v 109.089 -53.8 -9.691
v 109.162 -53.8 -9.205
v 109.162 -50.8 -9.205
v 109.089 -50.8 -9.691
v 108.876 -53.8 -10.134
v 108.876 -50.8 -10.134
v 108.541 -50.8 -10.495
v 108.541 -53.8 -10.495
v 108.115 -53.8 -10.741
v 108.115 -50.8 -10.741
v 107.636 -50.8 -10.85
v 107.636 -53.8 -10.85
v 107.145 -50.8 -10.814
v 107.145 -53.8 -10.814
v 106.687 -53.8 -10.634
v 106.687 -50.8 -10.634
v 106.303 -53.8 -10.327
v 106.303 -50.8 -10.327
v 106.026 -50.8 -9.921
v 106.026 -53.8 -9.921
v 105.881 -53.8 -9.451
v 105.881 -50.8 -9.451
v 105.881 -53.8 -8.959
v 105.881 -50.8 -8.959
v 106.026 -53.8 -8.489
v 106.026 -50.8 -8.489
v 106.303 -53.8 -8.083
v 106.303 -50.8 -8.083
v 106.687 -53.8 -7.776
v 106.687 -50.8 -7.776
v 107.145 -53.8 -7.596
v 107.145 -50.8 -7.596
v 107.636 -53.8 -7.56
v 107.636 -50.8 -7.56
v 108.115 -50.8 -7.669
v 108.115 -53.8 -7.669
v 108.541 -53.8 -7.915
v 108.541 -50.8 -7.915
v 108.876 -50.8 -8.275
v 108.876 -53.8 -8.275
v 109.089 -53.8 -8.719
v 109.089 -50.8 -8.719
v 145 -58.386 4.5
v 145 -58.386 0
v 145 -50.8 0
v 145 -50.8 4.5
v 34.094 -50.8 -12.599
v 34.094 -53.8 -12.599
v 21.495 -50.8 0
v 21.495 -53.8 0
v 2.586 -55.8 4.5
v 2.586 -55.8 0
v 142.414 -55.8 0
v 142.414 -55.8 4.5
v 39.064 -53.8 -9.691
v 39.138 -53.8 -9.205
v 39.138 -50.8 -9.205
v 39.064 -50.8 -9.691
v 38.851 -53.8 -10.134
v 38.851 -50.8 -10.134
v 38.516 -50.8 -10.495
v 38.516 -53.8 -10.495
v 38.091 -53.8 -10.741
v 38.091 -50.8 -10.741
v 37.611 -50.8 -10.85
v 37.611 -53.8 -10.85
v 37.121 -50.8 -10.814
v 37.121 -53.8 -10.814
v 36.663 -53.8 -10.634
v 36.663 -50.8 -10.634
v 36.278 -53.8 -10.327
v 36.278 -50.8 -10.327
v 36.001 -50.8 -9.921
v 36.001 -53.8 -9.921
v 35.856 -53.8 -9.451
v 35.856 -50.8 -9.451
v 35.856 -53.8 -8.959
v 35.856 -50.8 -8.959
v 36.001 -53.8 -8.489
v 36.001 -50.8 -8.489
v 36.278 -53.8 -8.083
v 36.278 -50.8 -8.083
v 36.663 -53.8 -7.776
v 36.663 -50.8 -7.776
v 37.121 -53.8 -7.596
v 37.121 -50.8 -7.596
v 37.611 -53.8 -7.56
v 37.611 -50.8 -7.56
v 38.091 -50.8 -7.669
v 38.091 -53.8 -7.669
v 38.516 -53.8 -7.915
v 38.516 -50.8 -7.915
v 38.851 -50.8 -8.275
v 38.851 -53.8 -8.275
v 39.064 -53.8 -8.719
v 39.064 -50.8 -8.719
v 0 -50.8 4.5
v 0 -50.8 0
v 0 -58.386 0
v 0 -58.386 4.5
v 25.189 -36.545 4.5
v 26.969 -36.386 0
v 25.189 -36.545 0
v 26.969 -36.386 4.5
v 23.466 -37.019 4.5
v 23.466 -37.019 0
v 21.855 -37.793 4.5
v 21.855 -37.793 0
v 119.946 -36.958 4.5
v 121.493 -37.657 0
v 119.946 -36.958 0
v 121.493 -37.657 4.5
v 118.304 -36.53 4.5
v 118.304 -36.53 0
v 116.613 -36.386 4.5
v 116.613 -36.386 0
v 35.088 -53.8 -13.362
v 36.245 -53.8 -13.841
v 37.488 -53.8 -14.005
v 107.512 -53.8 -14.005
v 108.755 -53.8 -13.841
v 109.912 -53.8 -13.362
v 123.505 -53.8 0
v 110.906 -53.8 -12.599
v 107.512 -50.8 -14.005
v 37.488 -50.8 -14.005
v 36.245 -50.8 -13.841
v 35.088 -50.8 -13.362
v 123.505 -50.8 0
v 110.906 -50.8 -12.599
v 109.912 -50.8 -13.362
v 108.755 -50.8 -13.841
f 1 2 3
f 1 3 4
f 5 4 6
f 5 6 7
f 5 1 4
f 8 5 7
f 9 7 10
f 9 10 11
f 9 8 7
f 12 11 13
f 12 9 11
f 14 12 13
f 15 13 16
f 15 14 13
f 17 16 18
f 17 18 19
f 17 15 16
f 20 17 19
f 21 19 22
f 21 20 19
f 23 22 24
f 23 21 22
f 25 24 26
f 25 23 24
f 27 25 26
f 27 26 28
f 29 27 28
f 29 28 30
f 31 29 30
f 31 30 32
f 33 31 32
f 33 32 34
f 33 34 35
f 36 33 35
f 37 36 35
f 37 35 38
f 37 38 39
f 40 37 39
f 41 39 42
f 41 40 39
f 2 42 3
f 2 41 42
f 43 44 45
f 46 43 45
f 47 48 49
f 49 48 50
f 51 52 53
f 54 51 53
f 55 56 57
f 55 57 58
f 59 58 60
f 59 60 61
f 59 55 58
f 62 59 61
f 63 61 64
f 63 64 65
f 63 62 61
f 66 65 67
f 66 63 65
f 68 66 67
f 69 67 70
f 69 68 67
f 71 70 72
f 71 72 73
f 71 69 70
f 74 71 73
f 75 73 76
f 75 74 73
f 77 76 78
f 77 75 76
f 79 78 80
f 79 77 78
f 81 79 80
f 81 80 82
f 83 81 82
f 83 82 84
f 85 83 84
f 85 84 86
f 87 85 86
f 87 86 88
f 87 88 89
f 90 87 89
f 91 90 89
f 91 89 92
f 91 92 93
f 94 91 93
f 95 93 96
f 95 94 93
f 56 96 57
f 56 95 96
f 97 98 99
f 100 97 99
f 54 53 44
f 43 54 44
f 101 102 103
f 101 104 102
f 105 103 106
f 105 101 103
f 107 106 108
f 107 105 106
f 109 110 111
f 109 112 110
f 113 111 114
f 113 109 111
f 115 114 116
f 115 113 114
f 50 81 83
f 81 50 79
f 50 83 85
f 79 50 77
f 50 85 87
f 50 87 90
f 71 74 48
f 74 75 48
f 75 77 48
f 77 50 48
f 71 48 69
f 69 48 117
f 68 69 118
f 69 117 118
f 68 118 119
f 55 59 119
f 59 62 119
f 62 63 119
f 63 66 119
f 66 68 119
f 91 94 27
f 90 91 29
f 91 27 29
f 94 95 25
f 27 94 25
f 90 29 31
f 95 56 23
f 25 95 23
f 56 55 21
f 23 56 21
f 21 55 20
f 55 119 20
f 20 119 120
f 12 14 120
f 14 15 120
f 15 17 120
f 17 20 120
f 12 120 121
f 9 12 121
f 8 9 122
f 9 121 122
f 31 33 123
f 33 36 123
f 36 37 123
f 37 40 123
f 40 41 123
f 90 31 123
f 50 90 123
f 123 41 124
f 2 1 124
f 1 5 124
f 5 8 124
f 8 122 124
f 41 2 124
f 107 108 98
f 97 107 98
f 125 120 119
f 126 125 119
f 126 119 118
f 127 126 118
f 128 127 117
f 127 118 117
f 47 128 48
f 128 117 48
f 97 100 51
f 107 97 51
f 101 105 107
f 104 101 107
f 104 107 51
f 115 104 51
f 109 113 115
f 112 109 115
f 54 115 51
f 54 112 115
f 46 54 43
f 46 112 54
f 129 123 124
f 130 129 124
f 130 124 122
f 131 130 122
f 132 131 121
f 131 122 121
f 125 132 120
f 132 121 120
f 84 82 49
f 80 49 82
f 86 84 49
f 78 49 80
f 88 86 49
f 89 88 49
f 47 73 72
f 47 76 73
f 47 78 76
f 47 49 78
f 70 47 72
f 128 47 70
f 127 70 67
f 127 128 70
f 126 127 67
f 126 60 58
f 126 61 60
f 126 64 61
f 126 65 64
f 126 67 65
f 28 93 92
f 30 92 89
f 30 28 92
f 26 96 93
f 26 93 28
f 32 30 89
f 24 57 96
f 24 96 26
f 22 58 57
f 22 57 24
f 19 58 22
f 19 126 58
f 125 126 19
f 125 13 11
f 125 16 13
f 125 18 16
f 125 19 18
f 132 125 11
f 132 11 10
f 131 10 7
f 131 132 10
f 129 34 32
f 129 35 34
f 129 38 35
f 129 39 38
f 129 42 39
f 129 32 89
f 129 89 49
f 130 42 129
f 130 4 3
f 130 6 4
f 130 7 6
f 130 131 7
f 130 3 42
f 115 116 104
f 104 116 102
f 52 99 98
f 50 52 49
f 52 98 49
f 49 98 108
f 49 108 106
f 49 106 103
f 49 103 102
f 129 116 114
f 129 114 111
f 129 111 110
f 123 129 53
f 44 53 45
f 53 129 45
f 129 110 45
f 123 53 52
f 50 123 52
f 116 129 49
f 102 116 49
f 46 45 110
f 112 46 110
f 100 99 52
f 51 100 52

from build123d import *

# Parameters (mm, degrees)
BOSS_EXTRUDE1_DEPTH = 4.5
SKETCH2_R           = 1.65
BOSS_EXTRUDE2_DEPTH = 3
FILLET1_R           = 10


with BuildPart() as part:
    # Sketch1 → Boss-Extrude1 (new body)
    with BuildSketch(Plane.XY):
        Polygon((145, -50.8), (119.218266921, -36.385786438), (24.218266921, -36.385786438), (0, -50.8), (0, -58.385786438), (2.585786438, -55.8), (142.414213562, -55.8), (145, -58.385786438), align=None)
    extrude(amount=BOSS_EXTRUDE1_DEPTH)

    # Sketch2 → Boss-Extrude2 (add)
    with BuildSketch(Plane(origin=(0, -53.8, 0), x_dir=(1, 0, 0), z_dir=(0, 1, 0))):
        with BuildLine():
            Line((123.505440237, 0), (110.90639088, 12.599049358))
            ThreePointArc((110.90639088, 12.599049358), (109.349158805, 13.639558564), (107.51227833, 14.004936808))
            Line((107.51227833, 14.004936808), (37.48772167, 14.004936808))
            ThreePointArc((37.48772167, 14.004936808), (35.650841195, 13.639558564), (34.09360912, 12.599049358))
            Line((34.09360912, 12.599049358), (21.494559763, 0))
            Line((21.494559763, 0), (123.505440237, 0))
        make_face()
        with Locations((37.48772167, 9.204936808)):
            Circle(SKETCH2_R, mode=Mode.SUBTRACT)
        with Locations((107.51227833, 9.204936808)):
            Circle(SKETCH2_R, mode=Mode.SUBTRACT)
    extrude(amount=BOSS_EXTRUDE2_DEPTH)

    # Fillet1
    fillet1_edges = [part.edges().sort_by_distance(p)[0] for p in [
        (119.218266921, -36.385786438, 2.25),
        (24.218266921, -36.385786438, 2.25),
    ]]
    fillet(fillet1_edges, radius=FILLET1_R)


solid = part.part
